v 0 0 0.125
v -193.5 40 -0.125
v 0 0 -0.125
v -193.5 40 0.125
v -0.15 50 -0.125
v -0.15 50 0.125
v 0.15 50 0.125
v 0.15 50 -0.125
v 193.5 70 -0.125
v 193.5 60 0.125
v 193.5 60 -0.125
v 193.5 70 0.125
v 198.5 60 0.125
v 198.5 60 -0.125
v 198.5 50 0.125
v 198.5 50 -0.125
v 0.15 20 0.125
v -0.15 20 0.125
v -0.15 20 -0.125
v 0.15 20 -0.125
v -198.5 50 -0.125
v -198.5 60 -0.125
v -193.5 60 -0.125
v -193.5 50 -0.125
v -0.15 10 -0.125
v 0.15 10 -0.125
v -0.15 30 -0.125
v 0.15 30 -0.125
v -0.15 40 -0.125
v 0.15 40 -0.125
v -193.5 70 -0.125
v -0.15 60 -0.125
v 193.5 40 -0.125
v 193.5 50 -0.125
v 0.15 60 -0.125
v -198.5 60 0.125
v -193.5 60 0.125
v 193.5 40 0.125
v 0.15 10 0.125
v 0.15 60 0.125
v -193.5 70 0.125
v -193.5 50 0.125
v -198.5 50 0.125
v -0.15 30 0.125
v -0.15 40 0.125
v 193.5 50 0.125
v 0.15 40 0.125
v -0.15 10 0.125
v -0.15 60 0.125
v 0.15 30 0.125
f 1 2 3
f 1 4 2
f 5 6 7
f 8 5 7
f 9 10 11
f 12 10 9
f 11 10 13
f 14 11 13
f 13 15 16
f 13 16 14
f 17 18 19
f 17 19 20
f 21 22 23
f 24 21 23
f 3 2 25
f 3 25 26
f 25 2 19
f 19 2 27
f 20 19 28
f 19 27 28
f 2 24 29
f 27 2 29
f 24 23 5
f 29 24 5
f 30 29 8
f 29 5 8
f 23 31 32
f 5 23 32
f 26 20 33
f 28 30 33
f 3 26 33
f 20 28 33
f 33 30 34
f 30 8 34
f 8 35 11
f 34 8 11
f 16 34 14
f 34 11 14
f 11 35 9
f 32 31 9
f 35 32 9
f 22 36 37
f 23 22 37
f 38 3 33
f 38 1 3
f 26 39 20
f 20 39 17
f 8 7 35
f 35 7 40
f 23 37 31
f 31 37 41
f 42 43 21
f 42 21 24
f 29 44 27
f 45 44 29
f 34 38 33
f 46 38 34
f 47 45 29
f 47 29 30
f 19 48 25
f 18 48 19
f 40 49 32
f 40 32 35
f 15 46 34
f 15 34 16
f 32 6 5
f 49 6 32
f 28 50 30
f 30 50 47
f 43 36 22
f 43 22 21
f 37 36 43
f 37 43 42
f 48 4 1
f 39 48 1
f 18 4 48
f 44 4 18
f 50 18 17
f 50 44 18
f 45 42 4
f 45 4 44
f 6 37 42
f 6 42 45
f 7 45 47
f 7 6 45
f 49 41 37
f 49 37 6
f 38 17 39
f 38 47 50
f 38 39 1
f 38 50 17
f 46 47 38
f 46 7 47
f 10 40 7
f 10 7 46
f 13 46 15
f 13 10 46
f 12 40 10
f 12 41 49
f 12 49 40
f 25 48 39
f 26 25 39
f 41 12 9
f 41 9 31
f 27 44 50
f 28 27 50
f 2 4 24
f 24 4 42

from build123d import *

# Parameters (mm, degrees)
BOSS_EXTRUDE1_DEPTH  = 0.125
SKETCH2_W            = 0.3
SKETCH2_H            = 10
CUT_EXTRUDE1_DEPTH   = 211.481145236
LPATTERN1_COUNT      = 3
LPATTERN1_PITCH      = 20
SKETCH3_W            = 5
SKETCH3_H            = 10
CUT_EXTRUDE2_DEPTH   = 211.481145236
LPATTERN2_COUNT      = 3
LPATTERN2_PITCH      = 20
LPATTERN2_COUNT_DIR2 = 2
LPATTERN2_PITCH_DIR2 = 392


with BuildPart() as part:
    # Sketch1 → Boss-Extrude1 (new, symmetric)
    with BuildSketch(Plane.XY):
        Polygon((0, 0), (193.5, 40), (198.5, 40), (198.5, 70), (193.5, 70), (-193.5, 70), (-198.5, 70), (-198.5, 40), (-193.5, 40), align=None)
    extrude(amount=BOSS_EXTRUDE1_DEPTH, both=True)

    # Sketch2 → Cut-Extrude1 (cut, through all)
    with BuildSketch(Plane.XY.offset(0.125)):
        with Locations((0, 55)):
            Rectangle(SKETCH2_W, SKETCH2_H)
    cut_extrude1 = extrude(amount=-CUT_EXTRUDE1_DEPTH, mode=Mode.SUBTRACT)

    # LPattern1: Cut-Extrude1 ×3
    with Locations(*[(0, -i * LPATTERN1_PITCH, 0) for i in range(1, LPATTERN1_COUNT)]):
        add(cut_extrude1, mode=Mode.SUBTRACT)

    # Sketch3 → Cut-Extrude2 (cut, through all)
    with BuildSketch(Plane.XY.offset(0.125)):
        with Locations((-196, 65)):
            Rectangle(SKETCH3_W, SKETCH3_H)
    cut_extrude2 = extrude(amount=-CUT_EXTRUDE2_DEPTH, mode=Mode.SUBTRACT)

    # LPattern2: Cut-Extrude2 3 × 2
    with Locations(*[(j * LPATTERN2_PITCH_DIR2, -i * LPATTERN2_PITCH, 0) for i in range(LPATTERN2_COUNT) for j in range(LPATTERN2_COUNT_DIR2) if (i, j) != (0, 0)]):
        add(cut_extrude2, mode=Mode.SUBTRACT)


solid = part.part
